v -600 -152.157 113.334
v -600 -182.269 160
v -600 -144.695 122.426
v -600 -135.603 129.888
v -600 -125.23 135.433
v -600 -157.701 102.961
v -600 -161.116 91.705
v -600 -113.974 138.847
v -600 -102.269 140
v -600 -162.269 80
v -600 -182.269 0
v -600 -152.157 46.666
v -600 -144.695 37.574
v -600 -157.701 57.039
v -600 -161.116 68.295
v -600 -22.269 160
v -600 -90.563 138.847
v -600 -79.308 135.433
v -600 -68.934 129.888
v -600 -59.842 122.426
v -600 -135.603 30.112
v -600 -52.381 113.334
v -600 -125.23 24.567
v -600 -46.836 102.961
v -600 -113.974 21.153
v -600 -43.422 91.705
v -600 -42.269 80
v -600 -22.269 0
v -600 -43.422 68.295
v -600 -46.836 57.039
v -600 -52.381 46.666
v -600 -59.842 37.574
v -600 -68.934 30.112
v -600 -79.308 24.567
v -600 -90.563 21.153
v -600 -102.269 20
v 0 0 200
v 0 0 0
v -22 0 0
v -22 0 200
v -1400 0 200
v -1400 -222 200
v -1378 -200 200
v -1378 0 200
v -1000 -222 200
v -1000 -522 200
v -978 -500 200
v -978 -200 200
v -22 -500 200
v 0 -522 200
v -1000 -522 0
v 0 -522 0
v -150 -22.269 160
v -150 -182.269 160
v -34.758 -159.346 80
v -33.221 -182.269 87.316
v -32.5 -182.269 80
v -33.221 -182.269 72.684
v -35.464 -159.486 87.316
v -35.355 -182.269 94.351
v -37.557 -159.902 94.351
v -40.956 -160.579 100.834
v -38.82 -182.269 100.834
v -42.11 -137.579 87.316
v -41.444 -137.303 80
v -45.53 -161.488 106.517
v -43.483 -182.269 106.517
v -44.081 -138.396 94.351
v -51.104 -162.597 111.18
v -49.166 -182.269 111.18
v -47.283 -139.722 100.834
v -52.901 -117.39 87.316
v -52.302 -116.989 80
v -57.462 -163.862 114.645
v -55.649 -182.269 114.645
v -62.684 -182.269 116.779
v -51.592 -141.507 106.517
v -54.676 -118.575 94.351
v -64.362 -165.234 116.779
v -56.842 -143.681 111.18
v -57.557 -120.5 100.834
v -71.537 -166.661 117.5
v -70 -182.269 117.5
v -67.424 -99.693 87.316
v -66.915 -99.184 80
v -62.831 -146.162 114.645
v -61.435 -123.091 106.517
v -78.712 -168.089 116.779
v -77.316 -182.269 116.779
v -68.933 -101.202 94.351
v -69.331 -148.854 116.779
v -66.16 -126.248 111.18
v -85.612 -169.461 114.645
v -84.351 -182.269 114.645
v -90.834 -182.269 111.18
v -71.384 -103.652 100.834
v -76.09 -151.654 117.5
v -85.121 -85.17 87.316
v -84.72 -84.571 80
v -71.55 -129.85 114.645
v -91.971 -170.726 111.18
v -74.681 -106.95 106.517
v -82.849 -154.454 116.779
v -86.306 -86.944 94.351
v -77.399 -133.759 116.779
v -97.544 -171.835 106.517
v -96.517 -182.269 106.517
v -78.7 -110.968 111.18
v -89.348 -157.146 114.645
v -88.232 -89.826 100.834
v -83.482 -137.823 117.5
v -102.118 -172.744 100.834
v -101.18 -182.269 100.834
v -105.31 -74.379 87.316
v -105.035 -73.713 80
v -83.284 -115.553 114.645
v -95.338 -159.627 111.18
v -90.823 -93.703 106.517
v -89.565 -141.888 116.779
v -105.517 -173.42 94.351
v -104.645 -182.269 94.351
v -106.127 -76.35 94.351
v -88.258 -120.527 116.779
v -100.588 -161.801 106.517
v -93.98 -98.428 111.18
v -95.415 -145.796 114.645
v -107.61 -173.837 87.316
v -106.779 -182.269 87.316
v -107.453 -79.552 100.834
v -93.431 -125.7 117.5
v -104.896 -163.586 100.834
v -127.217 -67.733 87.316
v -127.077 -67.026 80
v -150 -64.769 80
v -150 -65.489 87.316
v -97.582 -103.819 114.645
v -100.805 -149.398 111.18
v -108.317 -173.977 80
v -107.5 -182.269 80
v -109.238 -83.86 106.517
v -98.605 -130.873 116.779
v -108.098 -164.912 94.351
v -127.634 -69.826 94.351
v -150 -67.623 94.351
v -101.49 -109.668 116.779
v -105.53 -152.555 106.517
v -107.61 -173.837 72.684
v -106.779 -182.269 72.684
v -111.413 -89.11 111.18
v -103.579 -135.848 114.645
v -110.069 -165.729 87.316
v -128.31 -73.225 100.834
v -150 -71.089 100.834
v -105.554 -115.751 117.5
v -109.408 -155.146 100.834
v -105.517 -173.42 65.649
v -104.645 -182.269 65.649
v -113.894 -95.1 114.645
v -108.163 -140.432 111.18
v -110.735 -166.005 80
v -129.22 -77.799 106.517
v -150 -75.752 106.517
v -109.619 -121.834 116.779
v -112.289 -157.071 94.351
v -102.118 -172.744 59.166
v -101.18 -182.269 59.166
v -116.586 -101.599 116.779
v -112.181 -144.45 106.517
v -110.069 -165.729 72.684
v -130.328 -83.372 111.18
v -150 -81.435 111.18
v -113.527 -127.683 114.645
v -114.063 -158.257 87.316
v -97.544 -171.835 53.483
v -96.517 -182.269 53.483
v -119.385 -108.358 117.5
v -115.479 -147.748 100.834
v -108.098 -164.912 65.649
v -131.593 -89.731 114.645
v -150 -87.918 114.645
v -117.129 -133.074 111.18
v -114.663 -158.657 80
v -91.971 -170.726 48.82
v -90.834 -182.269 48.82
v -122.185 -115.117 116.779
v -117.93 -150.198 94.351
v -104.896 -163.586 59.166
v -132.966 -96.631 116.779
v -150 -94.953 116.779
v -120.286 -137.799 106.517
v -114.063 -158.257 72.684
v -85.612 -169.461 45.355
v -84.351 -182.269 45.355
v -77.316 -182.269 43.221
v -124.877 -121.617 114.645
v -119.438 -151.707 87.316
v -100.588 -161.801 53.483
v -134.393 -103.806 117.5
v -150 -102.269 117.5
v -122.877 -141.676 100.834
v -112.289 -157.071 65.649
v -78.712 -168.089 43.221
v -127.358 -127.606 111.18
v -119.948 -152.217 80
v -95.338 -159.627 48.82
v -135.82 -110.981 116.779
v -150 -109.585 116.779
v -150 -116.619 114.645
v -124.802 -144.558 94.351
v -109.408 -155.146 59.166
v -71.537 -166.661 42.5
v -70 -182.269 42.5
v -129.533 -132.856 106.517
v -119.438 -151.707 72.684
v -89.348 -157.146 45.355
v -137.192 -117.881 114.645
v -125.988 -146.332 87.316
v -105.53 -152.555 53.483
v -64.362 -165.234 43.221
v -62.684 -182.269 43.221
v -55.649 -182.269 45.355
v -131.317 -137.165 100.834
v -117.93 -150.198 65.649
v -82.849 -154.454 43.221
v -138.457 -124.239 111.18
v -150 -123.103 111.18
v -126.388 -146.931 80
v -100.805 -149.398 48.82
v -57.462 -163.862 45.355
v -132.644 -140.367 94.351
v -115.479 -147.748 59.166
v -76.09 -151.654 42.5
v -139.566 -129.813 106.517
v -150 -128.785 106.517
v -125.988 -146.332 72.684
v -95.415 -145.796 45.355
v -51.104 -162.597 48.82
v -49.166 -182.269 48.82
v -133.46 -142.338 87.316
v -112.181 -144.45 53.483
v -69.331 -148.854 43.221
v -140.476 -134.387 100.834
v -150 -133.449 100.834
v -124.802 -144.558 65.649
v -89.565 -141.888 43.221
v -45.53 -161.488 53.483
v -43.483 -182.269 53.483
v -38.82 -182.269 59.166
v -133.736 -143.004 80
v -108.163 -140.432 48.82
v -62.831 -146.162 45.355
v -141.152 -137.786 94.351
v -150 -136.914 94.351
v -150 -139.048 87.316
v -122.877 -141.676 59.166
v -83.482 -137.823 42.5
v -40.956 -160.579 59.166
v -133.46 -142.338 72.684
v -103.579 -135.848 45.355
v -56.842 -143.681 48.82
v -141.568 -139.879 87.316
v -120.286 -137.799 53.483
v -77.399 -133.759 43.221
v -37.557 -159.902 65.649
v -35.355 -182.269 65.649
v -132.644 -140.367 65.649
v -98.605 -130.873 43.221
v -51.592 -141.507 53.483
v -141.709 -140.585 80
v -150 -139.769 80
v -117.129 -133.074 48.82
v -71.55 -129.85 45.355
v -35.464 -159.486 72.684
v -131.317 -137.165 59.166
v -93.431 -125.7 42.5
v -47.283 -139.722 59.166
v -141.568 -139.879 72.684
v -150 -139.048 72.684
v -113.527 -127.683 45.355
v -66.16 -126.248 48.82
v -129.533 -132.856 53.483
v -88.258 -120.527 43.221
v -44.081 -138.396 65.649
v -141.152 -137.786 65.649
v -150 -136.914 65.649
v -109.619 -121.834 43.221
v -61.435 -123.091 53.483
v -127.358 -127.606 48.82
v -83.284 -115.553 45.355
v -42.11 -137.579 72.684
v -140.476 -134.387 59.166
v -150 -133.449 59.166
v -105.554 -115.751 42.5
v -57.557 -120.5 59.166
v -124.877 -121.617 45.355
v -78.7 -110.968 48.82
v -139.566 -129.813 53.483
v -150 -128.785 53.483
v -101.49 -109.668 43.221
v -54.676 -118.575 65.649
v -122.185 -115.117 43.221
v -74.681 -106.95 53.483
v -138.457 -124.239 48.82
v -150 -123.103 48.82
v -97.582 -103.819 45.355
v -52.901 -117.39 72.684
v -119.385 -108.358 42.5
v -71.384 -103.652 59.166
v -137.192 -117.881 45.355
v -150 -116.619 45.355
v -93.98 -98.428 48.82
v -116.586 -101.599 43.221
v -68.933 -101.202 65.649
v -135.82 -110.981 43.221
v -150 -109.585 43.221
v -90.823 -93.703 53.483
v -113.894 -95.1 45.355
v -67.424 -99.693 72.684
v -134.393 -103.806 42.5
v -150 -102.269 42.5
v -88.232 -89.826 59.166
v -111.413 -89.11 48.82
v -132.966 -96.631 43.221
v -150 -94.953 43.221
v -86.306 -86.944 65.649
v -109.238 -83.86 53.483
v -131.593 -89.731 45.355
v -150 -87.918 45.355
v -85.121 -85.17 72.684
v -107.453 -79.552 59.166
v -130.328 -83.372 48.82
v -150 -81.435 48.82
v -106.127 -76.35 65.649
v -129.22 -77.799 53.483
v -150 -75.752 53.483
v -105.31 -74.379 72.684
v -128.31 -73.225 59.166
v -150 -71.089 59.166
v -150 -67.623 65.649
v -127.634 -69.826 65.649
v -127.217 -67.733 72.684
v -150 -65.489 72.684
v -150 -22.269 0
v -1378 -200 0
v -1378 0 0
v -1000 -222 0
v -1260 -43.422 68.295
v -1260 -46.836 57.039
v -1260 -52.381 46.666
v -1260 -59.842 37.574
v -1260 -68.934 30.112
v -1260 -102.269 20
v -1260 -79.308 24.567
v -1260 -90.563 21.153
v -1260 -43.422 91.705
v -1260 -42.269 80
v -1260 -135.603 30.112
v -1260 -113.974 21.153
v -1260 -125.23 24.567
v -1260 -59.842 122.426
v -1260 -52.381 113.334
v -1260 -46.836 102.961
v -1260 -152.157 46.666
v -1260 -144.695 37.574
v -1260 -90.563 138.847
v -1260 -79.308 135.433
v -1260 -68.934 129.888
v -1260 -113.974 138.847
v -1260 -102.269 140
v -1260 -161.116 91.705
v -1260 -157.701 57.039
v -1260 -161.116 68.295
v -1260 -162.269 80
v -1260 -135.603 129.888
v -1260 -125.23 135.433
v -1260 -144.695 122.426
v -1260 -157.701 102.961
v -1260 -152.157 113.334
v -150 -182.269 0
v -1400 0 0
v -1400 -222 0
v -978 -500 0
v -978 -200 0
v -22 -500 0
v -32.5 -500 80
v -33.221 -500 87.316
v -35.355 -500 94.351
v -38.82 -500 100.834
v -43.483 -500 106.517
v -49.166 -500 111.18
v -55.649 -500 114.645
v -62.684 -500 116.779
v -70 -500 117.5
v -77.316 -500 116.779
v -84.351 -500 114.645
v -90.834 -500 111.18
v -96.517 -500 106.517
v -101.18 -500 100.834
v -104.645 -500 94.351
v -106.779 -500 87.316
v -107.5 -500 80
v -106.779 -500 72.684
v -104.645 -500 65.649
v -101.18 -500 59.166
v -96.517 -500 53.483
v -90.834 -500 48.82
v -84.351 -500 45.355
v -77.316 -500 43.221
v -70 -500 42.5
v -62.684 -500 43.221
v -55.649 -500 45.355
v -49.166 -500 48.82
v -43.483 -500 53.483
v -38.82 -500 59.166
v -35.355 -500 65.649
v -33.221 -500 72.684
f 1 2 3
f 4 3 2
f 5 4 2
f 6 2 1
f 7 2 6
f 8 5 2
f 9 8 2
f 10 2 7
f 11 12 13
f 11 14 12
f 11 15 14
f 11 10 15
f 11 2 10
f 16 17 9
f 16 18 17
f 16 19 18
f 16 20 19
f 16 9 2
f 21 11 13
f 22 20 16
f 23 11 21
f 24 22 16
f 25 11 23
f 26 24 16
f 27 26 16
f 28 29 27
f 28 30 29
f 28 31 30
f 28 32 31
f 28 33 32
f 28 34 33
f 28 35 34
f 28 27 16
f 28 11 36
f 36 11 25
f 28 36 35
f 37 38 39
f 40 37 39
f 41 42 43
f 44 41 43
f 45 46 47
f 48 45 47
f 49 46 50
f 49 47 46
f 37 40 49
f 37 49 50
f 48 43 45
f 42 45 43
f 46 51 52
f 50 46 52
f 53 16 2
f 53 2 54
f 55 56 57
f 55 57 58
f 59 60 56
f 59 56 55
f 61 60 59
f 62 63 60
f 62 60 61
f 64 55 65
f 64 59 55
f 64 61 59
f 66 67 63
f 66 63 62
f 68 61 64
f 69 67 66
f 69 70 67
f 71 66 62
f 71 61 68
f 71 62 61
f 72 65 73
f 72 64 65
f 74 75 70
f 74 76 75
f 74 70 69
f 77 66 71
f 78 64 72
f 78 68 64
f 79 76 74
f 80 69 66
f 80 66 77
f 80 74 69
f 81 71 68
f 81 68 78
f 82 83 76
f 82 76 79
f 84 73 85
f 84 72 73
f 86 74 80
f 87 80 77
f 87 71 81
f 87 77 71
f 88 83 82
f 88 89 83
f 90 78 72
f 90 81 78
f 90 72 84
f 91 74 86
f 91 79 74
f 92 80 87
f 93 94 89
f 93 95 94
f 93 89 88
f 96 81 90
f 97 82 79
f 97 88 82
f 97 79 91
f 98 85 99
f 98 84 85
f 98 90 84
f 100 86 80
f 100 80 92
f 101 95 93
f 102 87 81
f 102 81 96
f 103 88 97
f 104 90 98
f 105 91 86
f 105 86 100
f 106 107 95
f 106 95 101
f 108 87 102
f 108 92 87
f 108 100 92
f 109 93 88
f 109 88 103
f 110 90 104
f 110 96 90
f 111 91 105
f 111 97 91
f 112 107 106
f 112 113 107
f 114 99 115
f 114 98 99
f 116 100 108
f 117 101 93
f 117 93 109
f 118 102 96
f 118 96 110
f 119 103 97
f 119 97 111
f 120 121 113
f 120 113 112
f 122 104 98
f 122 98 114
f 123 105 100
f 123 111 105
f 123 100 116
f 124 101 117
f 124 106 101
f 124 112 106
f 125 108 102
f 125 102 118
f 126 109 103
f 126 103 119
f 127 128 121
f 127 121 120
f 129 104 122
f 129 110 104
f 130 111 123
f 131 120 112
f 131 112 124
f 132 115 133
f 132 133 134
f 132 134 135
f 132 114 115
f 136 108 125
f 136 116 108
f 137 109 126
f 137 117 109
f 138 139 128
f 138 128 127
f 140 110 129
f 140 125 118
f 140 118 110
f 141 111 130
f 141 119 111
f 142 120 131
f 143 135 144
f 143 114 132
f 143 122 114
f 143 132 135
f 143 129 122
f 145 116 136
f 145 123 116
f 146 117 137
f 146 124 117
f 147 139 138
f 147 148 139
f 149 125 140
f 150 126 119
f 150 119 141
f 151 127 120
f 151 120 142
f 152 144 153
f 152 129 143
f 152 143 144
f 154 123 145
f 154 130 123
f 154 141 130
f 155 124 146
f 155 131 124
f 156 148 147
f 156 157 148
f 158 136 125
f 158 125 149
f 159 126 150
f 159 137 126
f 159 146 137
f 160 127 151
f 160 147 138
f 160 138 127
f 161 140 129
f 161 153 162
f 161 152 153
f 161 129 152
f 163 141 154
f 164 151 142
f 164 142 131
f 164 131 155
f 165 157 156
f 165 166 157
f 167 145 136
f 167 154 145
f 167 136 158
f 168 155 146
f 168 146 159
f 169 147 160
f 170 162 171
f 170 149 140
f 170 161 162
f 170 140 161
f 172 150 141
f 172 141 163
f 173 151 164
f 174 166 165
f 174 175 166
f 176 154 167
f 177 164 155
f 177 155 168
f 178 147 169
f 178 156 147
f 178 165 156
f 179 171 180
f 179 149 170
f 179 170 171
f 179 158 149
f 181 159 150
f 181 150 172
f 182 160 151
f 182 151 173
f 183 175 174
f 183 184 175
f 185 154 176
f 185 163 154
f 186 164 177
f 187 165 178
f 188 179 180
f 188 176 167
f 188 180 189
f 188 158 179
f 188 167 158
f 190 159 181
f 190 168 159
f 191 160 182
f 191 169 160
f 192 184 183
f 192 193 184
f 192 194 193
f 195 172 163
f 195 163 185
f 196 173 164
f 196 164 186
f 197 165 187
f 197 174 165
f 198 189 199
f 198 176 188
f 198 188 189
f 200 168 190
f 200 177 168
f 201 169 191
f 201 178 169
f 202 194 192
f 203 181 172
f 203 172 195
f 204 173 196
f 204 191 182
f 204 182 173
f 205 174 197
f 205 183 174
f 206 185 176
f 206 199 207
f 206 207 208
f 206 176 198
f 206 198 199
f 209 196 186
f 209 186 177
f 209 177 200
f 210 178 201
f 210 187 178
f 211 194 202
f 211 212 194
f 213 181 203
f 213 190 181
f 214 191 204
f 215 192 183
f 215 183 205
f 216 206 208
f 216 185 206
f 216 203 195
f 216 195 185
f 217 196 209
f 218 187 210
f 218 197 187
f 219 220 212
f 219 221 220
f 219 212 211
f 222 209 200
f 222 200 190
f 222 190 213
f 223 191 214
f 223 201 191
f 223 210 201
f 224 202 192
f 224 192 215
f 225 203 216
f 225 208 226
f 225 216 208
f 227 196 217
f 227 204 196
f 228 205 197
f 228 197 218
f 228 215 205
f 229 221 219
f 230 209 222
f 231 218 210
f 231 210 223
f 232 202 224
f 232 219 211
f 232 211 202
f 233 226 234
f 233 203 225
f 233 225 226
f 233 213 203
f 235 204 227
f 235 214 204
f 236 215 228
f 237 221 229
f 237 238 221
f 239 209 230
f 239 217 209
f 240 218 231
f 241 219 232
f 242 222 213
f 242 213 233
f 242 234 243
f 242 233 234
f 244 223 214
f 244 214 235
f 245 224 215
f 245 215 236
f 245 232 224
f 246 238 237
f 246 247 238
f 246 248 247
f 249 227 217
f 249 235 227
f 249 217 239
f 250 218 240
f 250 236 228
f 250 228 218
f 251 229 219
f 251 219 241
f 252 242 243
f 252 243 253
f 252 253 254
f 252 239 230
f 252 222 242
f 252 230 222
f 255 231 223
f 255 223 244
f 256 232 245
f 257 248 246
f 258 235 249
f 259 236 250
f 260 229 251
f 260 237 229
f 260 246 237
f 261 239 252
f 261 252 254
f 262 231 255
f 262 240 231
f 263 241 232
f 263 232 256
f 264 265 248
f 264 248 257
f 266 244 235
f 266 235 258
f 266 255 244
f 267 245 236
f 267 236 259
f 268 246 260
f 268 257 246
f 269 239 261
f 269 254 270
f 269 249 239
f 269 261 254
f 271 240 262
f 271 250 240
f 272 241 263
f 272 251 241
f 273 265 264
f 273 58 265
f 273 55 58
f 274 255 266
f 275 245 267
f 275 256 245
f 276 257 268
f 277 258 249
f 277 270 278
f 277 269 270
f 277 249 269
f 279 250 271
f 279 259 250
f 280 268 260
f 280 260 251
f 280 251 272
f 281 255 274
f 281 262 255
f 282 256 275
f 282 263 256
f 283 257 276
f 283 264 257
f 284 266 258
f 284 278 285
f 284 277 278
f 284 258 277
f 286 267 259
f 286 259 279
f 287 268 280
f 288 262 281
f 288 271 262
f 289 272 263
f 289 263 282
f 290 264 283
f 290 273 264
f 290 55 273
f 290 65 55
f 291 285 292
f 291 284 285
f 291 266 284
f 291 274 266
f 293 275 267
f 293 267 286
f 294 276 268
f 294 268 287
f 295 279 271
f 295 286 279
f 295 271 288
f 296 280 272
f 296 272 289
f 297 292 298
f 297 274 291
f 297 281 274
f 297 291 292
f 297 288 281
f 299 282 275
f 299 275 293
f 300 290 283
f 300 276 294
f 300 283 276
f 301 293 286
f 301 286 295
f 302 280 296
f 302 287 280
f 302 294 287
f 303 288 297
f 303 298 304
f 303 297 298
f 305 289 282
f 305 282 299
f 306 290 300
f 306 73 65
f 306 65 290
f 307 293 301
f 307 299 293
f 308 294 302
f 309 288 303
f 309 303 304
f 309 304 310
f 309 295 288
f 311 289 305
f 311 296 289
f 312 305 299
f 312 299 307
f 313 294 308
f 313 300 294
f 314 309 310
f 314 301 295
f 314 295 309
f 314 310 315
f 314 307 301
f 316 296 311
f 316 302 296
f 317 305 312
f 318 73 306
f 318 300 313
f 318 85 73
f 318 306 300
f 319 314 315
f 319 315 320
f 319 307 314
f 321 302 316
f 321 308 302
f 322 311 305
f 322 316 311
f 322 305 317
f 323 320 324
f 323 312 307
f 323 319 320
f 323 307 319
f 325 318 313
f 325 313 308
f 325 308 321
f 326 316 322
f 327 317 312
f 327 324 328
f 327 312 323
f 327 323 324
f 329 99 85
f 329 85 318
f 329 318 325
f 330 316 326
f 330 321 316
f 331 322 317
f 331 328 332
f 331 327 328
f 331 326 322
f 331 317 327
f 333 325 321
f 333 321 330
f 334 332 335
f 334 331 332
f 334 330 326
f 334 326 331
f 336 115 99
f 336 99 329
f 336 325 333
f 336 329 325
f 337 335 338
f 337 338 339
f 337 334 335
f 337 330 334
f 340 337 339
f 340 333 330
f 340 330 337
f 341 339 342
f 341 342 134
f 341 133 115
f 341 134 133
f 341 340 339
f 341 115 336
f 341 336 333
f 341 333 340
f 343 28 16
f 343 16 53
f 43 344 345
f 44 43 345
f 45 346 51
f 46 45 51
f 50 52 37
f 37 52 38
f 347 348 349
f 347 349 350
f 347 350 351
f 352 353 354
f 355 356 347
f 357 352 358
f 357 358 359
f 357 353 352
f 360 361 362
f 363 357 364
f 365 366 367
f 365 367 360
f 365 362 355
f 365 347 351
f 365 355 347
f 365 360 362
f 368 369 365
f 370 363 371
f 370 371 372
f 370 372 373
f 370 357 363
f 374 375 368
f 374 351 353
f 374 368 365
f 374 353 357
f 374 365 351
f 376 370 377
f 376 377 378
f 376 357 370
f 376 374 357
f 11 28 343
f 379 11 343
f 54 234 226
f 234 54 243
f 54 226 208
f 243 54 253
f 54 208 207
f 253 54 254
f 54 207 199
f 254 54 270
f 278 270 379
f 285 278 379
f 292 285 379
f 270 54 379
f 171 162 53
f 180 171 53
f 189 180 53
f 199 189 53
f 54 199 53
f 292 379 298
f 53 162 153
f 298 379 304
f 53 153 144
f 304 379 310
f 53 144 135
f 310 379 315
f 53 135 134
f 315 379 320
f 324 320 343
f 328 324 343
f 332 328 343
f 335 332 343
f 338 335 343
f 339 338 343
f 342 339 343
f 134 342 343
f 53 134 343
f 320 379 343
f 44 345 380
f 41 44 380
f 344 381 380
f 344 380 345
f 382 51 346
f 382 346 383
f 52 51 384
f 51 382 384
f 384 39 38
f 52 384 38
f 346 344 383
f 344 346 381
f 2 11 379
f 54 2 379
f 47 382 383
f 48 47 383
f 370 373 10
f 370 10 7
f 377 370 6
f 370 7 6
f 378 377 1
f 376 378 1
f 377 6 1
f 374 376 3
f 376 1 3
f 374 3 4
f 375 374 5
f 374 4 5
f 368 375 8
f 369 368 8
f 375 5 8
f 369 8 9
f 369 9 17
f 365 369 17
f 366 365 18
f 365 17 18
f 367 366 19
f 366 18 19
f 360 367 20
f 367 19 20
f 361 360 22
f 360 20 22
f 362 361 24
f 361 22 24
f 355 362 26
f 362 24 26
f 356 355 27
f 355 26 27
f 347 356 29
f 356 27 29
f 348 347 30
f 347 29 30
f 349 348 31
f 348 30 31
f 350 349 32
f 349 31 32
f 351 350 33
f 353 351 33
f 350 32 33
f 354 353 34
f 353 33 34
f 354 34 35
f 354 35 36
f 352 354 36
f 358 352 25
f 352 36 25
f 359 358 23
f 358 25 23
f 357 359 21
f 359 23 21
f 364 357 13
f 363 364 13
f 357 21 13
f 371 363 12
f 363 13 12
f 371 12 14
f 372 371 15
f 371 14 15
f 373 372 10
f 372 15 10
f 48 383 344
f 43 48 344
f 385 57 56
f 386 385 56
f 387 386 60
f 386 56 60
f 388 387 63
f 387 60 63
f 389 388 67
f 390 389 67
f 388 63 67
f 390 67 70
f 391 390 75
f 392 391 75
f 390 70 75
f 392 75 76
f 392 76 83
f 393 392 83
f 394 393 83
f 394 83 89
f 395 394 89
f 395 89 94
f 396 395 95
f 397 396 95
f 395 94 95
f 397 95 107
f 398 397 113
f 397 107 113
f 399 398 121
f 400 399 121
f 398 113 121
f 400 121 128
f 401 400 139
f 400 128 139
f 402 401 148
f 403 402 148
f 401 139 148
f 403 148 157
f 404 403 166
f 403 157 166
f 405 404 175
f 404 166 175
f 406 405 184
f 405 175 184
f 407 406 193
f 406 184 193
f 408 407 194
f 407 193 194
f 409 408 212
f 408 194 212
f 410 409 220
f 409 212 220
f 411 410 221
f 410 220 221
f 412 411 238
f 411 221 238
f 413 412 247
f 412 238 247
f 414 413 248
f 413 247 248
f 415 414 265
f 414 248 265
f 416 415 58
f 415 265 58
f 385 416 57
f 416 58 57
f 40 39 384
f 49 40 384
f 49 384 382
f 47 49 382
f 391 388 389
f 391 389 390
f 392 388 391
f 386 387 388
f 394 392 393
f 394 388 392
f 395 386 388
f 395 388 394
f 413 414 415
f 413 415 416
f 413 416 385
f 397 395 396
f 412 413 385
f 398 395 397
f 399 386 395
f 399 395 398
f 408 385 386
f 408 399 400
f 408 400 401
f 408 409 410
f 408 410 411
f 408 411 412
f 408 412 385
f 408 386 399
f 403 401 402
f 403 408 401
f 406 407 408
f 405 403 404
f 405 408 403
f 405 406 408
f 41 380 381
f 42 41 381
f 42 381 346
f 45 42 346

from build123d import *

# Parameters (mm, degrees)
F0_W     = 450
F0_H     = 160
F1_DEPTH = 160
F3_DEPTH = 200
F4_R     = 60
F5_DEPTH = 660
F6_R     = 37.5
F9_DEPTH = 317.7312946493


with BuildPart() as f1:
    # F0 (on Top) → F1 (new body)
    with BuildSketch(Plane.XY):
        with Locations((-375, -102.2687053507)):
            Rectangle(F0_W, F0_H)
    extrude(amount=F1_DEPTH)

    # F4 (on face) → F5 (join)
    with BuildSketch(Plane(origin=(-600, 0, 0), x_dir=(0, -1, 0), z_dir=(-1, 0, 0))):
        with Locations((102.2687053507, 80)):
            Circle(F4_R)
    extrude(amount=F5_DEPTH)

    # F8: sweep along a path in F7
    with BuildLine(Plane.XY) as f8_path:
        ThreePointArc((-70, -182.2687053507), (-93.4314575051, -125.7001628558), (-150, -102.2687053507))
    # F6 (on face) → F8 (sweep)
    with BuildSketch(Plane.YZ.offset(-150)):
        with Locations((-102.2687053507, 80)):
            Circle(F6_R)
    sweep(path=f8_path.line)

    # F9 (add, through all): a face of the model
    f9_faces = [f1.faces().sort_by_distance(p)[0] for p in [
        (-70, -182.2687053507, 80),
    ]]
    extrude(f9_faces, amount=F9_DEPTH)


with BuildPart() as f3:
    # F2 (on Top) → F3 (new body)
    with BuildSketch(Plane.XY):
        Polygon((0, -522), (0, 0), (-22, 0), (-22, -500), (-978, -500), (-978, -200), (-1378, -200), (-1378, 0), (-1400, 0), (-1400, -222), (-1000, -222), (-1000, -522), align=None)
    extrude(amount=F3_DEPTH)


solid = Compound([f1.part, f3.part])
